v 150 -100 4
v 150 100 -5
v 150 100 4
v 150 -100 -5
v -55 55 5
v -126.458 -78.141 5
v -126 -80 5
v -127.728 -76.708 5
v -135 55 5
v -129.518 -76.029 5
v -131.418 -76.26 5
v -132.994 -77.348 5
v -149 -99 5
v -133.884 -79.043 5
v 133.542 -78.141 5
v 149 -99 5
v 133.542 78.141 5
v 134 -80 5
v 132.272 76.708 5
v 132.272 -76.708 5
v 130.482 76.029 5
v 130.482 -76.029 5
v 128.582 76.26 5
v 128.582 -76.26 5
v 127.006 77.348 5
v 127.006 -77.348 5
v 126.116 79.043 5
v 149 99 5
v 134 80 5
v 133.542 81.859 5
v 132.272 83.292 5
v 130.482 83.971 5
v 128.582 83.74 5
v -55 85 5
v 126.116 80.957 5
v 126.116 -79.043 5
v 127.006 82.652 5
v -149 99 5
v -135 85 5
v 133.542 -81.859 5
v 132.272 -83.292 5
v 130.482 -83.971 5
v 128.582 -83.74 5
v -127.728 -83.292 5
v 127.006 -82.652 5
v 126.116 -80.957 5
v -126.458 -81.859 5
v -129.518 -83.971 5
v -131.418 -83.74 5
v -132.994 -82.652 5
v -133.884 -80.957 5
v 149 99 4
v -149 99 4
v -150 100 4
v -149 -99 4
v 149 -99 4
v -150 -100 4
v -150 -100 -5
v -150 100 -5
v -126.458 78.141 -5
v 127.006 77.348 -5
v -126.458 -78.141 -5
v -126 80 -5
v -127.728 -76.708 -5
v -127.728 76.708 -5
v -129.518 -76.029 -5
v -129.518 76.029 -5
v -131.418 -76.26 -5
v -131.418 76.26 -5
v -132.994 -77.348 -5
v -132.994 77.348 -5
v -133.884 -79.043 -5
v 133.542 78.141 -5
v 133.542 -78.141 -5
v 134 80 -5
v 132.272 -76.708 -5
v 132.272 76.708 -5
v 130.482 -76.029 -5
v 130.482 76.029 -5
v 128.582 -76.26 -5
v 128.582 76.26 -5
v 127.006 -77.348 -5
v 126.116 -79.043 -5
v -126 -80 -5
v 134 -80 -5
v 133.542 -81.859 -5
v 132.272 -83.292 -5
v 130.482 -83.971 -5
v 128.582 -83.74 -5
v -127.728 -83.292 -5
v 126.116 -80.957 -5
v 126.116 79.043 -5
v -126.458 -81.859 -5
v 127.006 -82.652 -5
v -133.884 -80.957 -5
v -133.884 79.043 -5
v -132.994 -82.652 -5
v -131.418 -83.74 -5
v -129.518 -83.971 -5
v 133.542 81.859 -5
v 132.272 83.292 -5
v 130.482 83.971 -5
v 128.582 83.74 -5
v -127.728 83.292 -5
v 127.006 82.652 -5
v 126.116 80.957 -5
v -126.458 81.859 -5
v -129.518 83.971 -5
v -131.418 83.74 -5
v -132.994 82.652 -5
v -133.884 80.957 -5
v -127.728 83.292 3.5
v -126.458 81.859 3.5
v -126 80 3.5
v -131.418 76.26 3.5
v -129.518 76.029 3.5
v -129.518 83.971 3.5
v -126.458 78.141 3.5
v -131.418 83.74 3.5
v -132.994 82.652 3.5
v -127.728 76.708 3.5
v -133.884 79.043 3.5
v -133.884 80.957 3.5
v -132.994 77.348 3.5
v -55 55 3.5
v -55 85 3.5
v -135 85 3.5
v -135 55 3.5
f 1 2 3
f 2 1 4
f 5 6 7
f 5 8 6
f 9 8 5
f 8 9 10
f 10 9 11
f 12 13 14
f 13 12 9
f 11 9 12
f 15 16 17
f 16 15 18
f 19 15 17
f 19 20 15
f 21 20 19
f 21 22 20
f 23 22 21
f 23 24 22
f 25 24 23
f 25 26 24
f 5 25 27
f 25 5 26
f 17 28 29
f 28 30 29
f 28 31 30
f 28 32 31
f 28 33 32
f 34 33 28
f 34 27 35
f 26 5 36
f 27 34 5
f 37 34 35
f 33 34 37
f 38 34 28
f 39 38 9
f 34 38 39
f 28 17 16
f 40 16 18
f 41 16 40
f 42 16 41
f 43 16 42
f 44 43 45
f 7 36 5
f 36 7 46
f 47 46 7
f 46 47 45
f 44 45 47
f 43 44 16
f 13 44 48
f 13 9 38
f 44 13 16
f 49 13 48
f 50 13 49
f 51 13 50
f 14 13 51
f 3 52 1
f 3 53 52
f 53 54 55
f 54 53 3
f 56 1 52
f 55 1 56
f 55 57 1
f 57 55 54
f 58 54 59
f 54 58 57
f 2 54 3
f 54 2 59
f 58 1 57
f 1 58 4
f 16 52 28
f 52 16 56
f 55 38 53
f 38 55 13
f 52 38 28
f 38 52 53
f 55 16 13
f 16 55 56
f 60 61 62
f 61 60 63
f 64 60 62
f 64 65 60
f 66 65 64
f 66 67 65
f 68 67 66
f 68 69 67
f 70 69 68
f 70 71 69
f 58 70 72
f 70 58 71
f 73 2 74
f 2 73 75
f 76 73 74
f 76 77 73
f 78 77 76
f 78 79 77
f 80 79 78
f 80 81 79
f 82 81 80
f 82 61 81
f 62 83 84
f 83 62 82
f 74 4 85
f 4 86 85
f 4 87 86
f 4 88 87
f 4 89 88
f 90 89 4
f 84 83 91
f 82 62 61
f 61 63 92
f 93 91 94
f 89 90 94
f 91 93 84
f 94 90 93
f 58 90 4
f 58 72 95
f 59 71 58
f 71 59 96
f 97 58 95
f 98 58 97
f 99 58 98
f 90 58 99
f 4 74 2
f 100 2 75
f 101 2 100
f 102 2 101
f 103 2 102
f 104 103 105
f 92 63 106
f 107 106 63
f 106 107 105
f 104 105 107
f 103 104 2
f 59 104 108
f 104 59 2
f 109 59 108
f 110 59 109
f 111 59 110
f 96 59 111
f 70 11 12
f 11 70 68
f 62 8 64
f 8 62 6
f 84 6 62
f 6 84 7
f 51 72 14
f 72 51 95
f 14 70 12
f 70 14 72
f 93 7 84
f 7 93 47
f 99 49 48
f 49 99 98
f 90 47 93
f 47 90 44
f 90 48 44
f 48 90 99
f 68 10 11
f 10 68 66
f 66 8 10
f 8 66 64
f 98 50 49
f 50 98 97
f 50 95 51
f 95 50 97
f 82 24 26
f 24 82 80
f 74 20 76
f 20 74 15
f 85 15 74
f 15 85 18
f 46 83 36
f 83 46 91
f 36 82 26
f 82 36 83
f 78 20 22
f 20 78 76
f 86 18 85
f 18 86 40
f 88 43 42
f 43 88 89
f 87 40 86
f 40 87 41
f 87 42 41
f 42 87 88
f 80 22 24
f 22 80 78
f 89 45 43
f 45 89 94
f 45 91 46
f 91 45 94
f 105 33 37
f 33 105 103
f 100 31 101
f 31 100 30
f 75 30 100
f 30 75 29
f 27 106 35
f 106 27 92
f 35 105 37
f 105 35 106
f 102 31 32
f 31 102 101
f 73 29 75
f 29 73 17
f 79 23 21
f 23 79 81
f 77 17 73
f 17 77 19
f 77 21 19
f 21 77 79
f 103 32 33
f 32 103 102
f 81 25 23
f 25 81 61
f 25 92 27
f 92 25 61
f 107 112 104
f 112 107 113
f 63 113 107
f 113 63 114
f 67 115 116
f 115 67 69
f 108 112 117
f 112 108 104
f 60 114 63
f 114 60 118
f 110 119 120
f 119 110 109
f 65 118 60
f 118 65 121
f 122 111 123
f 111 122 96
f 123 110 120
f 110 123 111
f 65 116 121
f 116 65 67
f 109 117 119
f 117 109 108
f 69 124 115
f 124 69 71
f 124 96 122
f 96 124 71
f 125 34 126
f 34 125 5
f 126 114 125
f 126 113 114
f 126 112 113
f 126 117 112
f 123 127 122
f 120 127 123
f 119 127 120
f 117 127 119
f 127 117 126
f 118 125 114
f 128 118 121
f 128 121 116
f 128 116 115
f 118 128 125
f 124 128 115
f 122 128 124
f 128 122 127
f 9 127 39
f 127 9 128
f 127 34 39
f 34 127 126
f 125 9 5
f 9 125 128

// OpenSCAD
// Parameters
plate_length = 300; //[150:600:1]
plate_width = 200; //[100:400:1]
plate_thickness = 10; //[5:20:1]
edge_chamfer = 1; //[0.5:3:0.5]
corner_radius = 8; //[4:16:1]
hole_diameter = 8; //[3:16:0.5]
hole_edge_offset = 20; //[10:40:1]
label_length = 80; //[40:160:1]
label_width = 30; //[15:60:1]
label_depth = 0.5; //[0.2:2:0.1]
label_edge_margin = 15; //[8:30:1]
overlap = 1; //[0.5:2:0.5]

// Main tooling plate
module tooling_plate_sheet() {
  cube([plate_length, plate_width, plate_thickness], center=true);
}

// Edge chamfer
module edge_chamfer() {
  difference() {
    cube([plate_length, plate_width, edge_chamfer], center=true);
    translate([0, 0, -overlap])
      cube([plate_length - 2*edge_chamfer, plate_width - 2*edge_chamfer, edge_chamfer + 2*overlap], center=true);
  }
}

// Corner radius cutout
module corner_radius_cutout(x, y) {
  difference() {
    translate([x, y, 0])
      cube([corner_radius, corner_radius, plate_thickness + 2*overlap], center=true);
    translate([x, y, 0])
      cylinder(r=corner_radius, h=plate_thickness + 2*overlap, center=true);
  }
}

// Mounting holes
module mounting_hole(x, y) {
  translate([x, y, 0])
    cylinder(r=hole_diameter/2, h=plate_thickness + 2*overlap, center=true);
}

// Engraved label recess
module engraved_label() {
  translate([-plate_length/2 + label_edge_margin + label_length/2, plate_width/2 - label_edge_margin - label_width/2, plate_thickness/2 - label_depth/2])
    cube([label_length, label_width, label_depth + 2*overlap], center=true);
}

// Complete model
module complete_model() {
  difference() {
    tooling_plate_sheet();
    translate([0, 0, plate_thickness/2 - edge_chamfer/2])
      edge_chamfer();
    corner_radius_cutout(plate_length/2 - corner_radius/2, plate_width/2 - corner_radius/2);
    corner_radius_cutout(-plate_length/2 + corner_radius/2, plate_width/2 - corner_radius/2);
    corner_radius_cutout(plate_length/2 - corner_radius/2, -plate_width/2 + corner_radius/2);
    corner_radius_cutout(-plate_length/2 + corner_radius/2, -plate_width/2 + corner_radius/2);
    mounting_hole(-plate_length/2 + hole_edge_offset, -plate_width/2 + hole_edge_offset);
    mounting_hole(plate_length/2 - hole_edge_offset, -plate_width/2 + hole_edge_offset);
    mounting_hole(plate_length/2 - hole_edge_offset, plate_width/2 - hole_edge_offset);
    mounting_hole(-plate_length/2 + hole_edge_offset, plate_width/2 - hole_edge_offset);
    engraved_label();
  }
}

// Render the complete model
color("Silver") complete_model();
